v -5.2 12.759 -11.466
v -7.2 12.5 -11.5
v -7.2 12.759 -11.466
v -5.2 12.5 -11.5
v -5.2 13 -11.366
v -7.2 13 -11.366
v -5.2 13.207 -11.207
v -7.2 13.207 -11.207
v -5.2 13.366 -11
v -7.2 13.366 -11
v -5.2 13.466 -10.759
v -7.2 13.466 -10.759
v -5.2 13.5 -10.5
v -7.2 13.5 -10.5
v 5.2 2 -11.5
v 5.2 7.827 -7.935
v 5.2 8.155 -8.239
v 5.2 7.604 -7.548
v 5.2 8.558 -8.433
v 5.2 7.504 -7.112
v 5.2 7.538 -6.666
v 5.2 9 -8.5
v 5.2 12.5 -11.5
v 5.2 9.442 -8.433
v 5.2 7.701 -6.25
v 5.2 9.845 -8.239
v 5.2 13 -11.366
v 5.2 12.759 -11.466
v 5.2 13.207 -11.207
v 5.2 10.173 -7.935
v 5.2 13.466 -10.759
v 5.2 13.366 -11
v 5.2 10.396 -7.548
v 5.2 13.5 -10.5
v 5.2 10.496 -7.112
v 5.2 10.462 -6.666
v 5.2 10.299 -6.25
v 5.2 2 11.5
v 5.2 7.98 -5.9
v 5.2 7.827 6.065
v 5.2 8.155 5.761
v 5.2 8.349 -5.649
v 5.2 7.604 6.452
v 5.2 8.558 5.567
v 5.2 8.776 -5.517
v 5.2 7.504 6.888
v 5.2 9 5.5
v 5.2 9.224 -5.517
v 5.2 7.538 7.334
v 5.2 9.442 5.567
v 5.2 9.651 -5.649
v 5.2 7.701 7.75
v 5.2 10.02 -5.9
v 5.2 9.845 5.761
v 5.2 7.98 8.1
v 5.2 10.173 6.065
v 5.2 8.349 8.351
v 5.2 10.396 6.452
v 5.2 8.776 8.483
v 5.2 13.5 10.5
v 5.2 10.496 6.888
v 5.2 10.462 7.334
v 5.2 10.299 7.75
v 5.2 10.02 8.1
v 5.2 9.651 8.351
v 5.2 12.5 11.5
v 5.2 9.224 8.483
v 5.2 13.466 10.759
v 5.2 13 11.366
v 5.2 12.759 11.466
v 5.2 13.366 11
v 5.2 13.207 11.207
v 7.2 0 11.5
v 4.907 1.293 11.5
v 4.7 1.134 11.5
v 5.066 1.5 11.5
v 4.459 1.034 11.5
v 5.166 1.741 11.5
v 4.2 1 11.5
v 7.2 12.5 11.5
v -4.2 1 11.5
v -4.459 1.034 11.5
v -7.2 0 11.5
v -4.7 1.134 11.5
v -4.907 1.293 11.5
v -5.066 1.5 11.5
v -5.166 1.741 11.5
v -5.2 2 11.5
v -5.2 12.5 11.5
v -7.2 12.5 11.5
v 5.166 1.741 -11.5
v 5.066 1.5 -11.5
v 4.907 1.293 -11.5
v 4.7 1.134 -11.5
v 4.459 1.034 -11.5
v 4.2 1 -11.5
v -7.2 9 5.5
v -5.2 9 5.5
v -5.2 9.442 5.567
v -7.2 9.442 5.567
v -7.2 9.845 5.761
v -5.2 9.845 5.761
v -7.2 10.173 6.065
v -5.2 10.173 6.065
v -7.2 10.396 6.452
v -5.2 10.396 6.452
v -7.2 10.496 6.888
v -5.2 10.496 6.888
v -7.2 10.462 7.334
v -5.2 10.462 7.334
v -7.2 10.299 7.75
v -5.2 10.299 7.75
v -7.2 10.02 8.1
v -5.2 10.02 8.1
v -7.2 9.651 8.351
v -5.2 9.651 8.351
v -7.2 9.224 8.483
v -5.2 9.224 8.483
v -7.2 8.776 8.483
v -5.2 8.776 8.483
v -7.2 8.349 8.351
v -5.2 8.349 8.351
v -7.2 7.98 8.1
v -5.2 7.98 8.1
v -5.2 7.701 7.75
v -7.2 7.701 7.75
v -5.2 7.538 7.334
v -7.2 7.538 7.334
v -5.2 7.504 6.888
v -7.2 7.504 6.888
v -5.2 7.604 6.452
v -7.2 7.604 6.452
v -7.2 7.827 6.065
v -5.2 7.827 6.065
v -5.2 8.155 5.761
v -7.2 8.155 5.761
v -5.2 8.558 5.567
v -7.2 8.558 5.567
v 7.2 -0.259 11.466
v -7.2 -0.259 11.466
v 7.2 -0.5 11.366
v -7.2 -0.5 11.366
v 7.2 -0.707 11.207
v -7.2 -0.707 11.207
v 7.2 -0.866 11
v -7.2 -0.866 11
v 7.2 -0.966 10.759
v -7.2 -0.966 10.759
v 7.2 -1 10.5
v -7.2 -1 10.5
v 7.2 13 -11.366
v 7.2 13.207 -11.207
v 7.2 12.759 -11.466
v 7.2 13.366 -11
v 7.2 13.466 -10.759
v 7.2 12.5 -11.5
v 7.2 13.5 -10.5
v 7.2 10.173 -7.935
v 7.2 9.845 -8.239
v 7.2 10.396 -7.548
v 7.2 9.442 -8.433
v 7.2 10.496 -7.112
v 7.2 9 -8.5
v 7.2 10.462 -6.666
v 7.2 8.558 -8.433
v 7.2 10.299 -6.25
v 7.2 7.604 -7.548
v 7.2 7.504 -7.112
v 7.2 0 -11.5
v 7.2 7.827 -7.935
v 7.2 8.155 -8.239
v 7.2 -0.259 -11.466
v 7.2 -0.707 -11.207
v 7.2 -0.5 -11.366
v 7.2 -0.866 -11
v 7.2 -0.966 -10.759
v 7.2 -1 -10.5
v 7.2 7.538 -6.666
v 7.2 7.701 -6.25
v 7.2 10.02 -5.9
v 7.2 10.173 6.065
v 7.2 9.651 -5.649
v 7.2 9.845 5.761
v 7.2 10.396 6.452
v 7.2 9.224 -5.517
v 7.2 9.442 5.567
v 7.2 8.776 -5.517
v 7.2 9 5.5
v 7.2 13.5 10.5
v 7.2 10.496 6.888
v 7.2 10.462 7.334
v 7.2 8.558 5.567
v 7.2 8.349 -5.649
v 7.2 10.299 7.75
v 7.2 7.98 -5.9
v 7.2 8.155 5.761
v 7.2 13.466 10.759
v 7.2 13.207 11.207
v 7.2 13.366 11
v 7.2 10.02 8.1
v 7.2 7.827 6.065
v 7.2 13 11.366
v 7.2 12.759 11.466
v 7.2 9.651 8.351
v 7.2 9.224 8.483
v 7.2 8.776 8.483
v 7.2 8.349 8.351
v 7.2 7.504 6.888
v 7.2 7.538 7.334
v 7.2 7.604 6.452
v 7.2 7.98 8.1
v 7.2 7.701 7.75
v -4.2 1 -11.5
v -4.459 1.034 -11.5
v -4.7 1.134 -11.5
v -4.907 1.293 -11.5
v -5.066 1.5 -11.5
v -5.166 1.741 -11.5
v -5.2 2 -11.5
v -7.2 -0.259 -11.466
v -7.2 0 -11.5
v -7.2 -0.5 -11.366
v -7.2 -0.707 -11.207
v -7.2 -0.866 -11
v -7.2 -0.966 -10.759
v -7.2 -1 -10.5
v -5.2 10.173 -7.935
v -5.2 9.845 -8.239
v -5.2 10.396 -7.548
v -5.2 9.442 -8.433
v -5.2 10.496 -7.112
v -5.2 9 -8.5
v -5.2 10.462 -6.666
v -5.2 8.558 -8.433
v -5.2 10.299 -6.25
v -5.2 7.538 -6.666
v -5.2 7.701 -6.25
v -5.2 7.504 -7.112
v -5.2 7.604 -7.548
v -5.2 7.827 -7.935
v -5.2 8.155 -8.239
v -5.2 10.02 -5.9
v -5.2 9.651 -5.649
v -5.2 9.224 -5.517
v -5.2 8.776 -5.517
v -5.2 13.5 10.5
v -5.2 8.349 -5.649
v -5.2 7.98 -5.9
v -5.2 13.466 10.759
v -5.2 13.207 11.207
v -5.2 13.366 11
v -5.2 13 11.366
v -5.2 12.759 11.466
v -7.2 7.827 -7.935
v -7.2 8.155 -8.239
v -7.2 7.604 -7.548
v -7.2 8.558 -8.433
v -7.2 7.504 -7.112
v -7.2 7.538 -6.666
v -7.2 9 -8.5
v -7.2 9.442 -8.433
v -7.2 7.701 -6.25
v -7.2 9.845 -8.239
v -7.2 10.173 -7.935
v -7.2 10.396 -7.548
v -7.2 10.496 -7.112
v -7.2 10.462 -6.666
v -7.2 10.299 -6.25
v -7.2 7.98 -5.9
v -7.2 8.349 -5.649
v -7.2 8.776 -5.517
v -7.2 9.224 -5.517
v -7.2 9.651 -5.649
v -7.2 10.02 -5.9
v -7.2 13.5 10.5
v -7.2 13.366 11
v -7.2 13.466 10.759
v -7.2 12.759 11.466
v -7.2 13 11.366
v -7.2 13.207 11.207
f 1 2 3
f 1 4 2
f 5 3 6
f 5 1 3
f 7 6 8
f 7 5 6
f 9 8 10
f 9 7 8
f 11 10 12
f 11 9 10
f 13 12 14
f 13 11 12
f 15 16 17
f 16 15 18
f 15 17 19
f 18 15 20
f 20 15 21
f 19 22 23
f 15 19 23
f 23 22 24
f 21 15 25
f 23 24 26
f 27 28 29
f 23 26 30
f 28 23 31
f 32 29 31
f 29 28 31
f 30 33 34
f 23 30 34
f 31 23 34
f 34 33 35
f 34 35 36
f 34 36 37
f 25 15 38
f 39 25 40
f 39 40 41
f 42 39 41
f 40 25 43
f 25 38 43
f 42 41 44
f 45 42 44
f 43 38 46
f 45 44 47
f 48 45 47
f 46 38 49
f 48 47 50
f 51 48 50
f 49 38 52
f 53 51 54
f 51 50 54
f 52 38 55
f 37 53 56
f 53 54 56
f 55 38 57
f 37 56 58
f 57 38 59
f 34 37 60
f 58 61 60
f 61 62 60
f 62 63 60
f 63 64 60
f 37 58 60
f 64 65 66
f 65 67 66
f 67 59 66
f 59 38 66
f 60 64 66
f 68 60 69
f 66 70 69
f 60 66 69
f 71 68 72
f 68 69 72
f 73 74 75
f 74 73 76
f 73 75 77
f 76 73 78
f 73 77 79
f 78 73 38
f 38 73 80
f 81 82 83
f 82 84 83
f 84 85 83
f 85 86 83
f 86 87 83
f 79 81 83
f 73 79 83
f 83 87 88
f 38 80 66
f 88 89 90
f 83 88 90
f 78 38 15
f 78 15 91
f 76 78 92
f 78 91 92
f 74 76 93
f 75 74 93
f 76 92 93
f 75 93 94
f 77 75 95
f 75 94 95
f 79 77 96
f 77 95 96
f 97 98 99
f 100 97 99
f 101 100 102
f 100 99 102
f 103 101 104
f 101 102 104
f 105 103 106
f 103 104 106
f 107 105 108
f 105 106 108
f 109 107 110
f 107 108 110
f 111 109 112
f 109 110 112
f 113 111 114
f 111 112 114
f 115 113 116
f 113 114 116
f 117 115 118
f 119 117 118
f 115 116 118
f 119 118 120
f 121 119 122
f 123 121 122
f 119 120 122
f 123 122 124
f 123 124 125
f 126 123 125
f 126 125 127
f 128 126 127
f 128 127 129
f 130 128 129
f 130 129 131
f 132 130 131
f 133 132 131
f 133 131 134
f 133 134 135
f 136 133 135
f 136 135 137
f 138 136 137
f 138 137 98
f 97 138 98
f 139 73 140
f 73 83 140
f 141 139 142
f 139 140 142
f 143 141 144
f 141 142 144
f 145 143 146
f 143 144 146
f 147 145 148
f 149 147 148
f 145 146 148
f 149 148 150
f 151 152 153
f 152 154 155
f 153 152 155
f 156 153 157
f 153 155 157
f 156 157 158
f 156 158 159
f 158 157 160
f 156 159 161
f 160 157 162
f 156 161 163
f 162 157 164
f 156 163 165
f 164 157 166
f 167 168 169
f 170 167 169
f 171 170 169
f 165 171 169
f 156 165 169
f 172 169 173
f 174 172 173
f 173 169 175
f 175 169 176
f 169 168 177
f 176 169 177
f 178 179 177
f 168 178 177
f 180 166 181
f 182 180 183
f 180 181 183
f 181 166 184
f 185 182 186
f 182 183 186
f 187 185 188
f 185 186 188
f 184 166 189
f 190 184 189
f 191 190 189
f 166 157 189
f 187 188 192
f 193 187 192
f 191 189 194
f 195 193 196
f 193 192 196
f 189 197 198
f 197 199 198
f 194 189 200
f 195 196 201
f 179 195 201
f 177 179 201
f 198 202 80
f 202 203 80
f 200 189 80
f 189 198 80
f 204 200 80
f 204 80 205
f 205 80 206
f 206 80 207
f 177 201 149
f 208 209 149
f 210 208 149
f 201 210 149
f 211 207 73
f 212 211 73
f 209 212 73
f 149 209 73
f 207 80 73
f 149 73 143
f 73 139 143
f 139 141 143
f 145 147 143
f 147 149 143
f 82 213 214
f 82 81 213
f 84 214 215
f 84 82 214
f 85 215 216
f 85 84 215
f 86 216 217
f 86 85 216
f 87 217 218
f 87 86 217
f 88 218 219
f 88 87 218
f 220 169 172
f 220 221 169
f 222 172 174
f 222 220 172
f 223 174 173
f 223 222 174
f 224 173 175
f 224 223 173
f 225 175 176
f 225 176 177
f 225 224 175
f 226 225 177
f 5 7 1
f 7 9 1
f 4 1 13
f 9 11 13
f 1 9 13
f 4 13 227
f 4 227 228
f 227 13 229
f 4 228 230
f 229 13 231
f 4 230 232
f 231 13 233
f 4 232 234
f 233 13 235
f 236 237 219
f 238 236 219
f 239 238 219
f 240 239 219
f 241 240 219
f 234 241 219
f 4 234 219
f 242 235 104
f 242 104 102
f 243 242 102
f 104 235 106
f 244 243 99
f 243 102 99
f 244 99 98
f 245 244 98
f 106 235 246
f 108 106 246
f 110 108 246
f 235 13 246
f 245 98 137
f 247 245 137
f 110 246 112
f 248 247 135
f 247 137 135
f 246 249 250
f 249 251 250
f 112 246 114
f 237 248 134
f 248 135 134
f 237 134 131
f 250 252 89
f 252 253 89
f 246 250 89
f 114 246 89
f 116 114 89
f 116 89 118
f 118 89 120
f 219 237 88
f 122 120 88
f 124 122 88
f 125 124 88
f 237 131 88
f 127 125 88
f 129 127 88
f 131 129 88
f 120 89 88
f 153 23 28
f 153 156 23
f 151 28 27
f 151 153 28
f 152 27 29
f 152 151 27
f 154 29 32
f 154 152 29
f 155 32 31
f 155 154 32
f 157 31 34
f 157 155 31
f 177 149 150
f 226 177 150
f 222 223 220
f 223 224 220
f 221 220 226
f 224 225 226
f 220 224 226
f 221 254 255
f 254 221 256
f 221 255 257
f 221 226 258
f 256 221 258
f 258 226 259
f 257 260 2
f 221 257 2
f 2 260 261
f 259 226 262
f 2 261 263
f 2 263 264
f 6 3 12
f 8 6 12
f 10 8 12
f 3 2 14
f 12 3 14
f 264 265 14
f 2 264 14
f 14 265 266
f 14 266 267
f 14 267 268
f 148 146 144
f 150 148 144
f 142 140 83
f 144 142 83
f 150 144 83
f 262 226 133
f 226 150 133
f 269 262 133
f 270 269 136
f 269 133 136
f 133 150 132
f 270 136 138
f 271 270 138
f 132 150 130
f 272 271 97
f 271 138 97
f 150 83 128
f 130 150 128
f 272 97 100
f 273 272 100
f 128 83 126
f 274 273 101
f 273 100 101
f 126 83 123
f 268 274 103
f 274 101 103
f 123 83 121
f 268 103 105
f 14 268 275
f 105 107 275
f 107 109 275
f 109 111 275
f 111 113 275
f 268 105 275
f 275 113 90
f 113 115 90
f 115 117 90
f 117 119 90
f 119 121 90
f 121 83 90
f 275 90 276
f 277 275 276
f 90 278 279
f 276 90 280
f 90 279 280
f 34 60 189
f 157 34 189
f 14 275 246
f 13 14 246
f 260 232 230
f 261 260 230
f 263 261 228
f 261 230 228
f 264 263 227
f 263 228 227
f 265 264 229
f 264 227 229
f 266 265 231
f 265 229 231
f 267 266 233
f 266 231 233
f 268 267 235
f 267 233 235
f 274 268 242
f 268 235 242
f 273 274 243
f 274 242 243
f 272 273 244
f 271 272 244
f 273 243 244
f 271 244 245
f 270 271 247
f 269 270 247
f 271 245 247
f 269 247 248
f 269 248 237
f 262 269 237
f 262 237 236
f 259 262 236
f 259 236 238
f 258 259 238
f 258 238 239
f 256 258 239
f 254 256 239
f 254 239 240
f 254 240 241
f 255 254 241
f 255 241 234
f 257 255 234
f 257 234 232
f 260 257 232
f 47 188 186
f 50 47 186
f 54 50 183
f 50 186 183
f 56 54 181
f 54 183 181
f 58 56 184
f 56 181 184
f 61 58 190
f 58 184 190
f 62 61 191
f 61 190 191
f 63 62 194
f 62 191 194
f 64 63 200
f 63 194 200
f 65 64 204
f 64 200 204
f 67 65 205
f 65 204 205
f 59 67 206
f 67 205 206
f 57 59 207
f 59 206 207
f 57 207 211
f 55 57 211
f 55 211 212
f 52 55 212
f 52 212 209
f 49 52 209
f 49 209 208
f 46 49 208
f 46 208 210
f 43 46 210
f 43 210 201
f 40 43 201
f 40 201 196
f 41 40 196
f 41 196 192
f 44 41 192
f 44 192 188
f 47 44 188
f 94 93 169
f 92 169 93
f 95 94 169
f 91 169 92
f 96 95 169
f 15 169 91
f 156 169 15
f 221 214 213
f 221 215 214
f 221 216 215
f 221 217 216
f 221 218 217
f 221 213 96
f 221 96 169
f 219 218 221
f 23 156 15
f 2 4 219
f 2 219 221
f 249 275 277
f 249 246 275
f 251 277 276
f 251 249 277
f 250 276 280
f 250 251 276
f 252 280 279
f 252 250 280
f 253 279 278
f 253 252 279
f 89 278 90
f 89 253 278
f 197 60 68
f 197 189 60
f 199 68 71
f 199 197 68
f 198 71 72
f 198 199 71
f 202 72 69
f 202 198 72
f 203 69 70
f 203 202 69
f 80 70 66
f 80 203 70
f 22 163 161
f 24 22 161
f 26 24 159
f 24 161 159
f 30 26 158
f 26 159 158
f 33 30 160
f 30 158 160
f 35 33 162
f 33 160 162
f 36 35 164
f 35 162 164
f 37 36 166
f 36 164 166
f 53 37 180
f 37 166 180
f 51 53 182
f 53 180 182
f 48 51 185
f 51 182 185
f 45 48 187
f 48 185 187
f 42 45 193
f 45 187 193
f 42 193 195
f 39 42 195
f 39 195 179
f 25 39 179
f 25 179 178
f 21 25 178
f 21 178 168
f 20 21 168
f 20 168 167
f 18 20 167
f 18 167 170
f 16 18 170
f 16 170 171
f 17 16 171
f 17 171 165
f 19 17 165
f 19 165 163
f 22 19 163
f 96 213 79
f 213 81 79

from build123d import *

# Parameters (mm, degrees)
BOSS_EXTRUDE1_DEPTH     = 11.5
SKETCH2_R               = 1.5
CUT_EXTRUDE1_DEPTH      = 1
CUT_EXTRUDE1_DEPTH_BACK = 15.4
FILLET1_R               = 1
FILLET2_R               = 1
FILLET3_R               = 1


with BuildPart() as part:
    # Sketch1 → Boss-Extrude1 (new body, symmetric)
    with BuildSketch(Plane.XY):
        Polygon((-5.2, 1), (5.2, 1), (5.2, 13.5), (7.2, 13.5), (7.2, -1), (-7.2, -1), (-7.2, 13.5), (-5.2, 13.5), align=None)
    extrude(amount=BOSS_EXTRUDE1_DEPTH, both=True)

    # Sketch2 → Cut-Extrude1 (cut, two sides)
    with BuildSketch(Plane(origin=(7.2, 0, 0), x_dir=(0, 0, -1), z_dir=(1, 0, 0))) as cut_extrude1_sk:
        with Locations((-7, 9)):
            Circle(SKETCH2_R)
        with Locations((7, 9)):
            Circle(SKETCH2_R)
    extrude(amount=CUT_EXTRUDE1_DEPTH, mode=Mode.SUBTRACT)
    extrude(cut_extrude1_sk.sketch, amount=-CUT_EXTRUDE1_DEPTH_BACK, mode=Mode.SUBTRACT)

    # Fillet1
    fillet1_edges = [part.edges().sort_by_distance(p)[0] for p in [
        (0, -1, -11.5),
        (0, -1, 11.5),
    ]]
    fillet(fillet1_edges, radius=FILLET1_R)

    # Fillet2
    fillet2_edges = [part.edges().sort_by_distance(p)[0] for p in [
        (-5.2, 1, 0),
        (5.2, 1, 0),
    ]]
    fillet(fillet2_edges, radius=FILLET2_R)

    # Fillet3
    fillet3_edges = [part.edges().sort_by_distance(p)[0] for p in [
        (-6.2, 13.5, -11.5),
        (6.2, 13.5, 11.5),
        (-6.2, 13.5, 11.5),
        (6.2, 13.5, -11.5),
    ]]
    fillet(fillet3_edges, radius=FILLET3_R)


solid = part.part
